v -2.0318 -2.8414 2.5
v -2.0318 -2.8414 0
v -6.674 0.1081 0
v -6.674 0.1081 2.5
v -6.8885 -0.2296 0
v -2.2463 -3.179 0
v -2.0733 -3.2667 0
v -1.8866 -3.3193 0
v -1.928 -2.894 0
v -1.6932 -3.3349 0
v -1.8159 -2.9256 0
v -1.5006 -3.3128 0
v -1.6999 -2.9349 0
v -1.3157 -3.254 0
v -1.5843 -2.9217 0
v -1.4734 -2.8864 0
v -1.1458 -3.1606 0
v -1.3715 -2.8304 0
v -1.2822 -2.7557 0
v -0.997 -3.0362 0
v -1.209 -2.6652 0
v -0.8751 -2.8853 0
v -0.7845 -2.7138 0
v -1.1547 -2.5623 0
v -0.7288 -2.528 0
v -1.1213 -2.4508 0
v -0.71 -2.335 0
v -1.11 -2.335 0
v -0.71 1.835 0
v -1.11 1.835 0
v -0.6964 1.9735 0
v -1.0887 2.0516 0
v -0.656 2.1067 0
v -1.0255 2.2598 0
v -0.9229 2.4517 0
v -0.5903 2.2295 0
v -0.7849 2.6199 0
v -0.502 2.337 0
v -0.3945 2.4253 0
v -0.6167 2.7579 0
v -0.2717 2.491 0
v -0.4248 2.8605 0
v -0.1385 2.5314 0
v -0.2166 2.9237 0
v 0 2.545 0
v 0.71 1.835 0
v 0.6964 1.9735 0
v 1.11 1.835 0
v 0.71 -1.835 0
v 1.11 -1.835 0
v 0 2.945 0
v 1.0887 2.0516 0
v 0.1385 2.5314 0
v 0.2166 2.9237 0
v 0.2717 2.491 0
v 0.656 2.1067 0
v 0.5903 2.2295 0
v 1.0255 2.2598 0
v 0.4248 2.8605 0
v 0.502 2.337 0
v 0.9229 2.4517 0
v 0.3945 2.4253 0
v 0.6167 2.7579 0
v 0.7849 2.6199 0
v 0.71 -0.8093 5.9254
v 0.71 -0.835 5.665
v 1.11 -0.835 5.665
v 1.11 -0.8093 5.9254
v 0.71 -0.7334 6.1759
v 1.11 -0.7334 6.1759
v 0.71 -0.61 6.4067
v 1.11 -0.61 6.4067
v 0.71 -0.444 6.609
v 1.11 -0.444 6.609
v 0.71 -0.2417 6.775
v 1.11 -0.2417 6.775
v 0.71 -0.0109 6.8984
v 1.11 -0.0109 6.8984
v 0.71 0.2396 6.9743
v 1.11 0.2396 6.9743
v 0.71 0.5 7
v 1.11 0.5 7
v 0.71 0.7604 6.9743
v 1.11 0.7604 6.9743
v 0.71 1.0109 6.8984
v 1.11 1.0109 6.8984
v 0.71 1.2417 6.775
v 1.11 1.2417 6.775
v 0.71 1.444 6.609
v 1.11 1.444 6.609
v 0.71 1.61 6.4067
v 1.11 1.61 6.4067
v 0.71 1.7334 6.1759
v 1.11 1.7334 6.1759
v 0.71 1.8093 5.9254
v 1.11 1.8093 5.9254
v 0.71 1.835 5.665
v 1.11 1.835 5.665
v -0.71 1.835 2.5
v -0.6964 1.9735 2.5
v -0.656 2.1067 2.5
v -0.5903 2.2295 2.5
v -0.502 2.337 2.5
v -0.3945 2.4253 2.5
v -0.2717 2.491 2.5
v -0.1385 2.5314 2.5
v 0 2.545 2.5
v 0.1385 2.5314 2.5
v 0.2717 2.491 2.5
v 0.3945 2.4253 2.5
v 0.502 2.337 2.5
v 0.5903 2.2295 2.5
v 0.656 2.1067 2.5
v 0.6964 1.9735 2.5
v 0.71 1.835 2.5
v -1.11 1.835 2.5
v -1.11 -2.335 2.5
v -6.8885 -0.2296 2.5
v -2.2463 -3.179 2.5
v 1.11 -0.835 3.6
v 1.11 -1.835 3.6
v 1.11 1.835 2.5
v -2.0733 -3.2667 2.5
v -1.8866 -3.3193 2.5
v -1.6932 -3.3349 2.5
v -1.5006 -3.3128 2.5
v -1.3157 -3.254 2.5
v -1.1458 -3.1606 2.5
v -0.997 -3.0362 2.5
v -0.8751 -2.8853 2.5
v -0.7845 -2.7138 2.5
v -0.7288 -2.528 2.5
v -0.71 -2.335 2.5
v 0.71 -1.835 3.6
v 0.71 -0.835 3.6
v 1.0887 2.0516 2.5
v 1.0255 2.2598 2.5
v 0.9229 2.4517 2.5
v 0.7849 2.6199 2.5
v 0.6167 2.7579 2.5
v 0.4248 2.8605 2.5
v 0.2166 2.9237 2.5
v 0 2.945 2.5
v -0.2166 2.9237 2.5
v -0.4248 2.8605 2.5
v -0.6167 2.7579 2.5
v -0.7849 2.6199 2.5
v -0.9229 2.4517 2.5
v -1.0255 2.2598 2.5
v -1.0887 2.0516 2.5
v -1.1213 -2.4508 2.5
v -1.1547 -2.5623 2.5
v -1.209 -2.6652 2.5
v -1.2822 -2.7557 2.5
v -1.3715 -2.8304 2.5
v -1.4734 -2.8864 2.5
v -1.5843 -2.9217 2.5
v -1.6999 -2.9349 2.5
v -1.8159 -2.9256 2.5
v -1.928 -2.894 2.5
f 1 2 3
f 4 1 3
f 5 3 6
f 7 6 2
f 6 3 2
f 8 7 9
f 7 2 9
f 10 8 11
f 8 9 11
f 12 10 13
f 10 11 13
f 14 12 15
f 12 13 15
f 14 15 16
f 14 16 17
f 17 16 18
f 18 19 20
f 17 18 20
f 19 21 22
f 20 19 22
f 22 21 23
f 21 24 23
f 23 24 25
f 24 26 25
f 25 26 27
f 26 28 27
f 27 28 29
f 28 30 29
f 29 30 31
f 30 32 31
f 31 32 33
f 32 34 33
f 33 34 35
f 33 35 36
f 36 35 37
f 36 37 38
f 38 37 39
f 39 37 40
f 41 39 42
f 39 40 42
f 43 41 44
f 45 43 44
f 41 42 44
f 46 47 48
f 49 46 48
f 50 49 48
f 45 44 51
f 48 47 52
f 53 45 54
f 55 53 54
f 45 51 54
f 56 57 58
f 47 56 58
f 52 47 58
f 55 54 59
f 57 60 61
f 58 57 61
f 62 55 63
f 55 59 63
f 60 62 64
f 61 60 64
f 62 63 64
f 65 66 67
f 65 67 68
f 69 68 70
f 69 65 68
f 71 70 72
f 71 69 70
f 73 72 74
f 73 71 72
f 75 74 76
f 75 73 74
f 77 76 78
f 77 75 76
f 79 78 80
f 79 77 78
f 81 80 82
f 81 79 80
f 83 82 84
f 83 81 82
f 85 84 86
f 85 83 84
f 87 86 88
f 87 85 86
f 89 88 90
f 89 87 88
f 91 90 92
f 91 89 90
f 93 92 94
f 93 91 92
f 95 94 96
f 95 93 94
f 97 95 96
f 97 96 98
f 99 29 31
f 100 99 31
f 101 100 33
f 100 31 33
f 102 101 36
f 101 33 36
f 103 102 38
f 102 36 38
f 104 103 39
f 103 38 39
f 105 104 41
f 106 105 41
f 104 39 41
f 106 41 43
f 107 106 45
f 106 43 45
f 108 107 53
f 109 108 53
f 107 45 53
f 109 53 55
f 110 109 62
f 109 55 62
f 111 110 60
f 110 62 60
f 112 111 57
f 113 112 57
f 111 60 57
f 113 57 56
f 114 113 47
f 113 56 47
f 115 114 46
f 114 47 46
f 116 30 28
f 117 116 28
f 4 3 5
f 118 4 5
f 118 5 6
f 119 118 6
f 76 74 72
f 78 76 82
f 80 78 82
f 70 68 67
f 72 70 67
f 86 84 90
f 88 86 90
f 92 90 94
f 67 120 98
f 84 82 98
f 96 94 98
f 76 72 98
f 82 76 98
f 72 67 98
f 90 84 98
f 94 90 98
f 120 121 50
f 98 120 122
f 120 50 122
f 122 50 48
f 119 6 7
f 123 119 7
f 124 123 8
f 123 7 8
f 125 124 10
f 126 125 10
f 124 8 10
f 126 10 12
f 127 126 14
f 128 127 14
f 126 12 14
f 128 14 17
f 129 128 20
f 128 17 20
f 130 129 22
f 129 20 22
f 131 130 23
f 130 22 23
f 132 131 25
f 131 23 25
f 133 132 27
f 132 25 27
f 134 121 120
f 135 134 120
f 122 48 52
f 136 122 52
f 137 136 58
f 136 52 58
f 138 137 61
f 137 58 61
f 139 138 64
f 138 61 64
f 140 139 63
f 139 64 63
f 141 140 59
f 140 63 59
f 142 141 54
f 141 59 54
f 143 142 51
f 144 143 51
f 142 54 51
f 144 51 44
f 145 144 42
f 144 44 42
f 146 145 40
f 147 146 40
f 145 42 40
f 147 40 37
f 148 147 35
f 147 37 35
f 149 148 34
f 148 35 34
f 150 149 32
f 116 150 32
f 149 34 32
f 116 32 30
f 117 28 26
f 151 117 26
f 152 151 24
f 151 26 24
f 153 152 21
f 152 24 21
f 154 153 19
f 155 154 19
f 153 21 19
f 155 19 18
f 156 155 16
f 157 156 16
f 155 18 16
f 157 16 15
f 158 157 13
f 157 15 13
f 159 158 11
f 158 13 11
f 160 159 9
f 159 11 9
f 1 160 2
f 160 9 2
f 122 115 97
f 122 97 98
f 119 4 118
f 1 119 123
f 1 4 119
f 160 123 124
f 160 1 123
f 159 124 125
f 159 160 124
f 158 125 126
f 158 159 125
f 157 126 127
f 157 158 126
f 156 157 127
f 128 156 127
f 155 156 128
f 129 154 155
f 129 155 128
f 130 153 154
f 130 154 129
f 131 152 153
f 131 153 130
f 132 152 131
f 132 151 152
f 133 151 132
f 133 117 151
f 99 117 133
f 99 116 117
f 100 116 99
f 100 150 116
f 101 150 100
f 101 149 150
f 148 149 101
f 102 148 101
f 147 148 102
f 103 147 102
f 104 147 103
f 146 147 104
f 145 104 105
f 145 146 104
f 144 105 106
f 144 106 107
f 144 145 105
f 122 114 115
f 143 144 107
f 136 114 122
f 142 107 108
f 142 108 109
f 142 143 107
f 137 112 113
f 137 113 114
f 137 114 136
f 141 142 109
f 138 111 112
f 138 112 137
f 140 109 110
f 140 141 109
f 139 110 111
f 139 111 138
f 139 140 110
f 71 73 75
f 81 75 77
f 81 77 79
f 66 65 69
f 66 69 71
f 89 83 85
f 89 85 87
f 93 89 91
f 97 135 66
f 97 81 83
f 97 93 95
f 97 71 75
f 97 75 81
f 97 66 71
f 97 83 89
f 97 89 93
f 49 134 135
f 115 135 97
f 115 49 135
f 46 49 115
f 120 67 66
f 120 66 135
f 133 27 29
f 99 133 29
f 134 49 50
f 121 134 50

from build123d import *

# Parameters (mm, degrees)
BASE_FLANGE2_DEPTH  = 2.5
SKETCH10_W          = 0.4
SKETCH10_H          = 3.67
BOSS_EXTRUDE1_DEPTH = 4.5
SKETCH11_W          = 3.4
SKETCH11_H          = 1
CUT_EXTRUDE1_DEPTH  = 12.139958989
FILLET1_RADIUS      = 1.335
FILLET1_LENGTH      = 0.4


# Sheet-metal steps are written as plain solids
with BuildPart() as part:
    # Sketch1 → Base-Flange2 (new body)
    with BuildSketch(Plane.XY):
        with BuildLine():
            Line((-6.888528694, -0.229568793), (-2.246268811, -3.179047252))
            ThreePointArc((-2.246268811, -3.179047252), (-1.228475759, -3.211432773), (-0.71, -2.335))
            Line((-0.71, -2.335), (-0.71, -1.835))
            Line((-0.71, -1.835), (-0.71, 1.835))
            ThreePointArc((-0.71, 1.835), (0, 2.545), (0.71, 1.835))
            Line((0.71, 1.835), (0.71, -1.835))
            Line((0.71, -1.835), (1.11, -1.835))
            Line((1.11, -1.835), (1.11, 1.835))
            ThreePointArc((1.11, 1.835), (0, 2.945), (-1.11, 1.835))
            Line((-1.11, 1.835), (-1.11, -1.835))
            Line((-1.11, -1.835), (-1.11, -2.335))
            ThreePointArc((-1.11, -2.335), (-1.421085455, -2.860859664), (-2.031761286, -2.841428351))
            Line((-2.031761286, -2.841428351), (-6.67402117, 0.108050107))
            Line((-6.67402117, 0.108050107), (-6.888528694, -0.229568793))
        make_face()
    extrude(amount=BASE_FLANGE2_DEPTH)

    # Sketch10 → Boss-Extrude1 (add)
    with BuildSketch(Plane.XY.offset(2.5)):
        with Locations((0.91, 0)):
            Rectangle(SKETCH10_W, SKETCH10_H)
    extrude(amount=BOSS_EXTRUDE1_DEPTH)

    # Sketch11 → Cut-Extrude1 (cut, through all)
    with BuildSketch(Plane(origin=(1.11, 0, 0), x_dir=(0, 0, -1), z_dir=(1, 0, 0))):
        with Locations((-5.3, -1.335)):
            Rectangle(SKETCH11_W, SKETCH11_H)
    extrude(amount=-CUT_EXTRUDE1_DEPTH, mode=Mode.SUBTRACT)

    # Fillet1: full round fillet: the end face becomes a half cylinder, R = half its width
    fillet1_face = Plane((0.91, 0.5, 7), x_dir=(-1, 0, 0), z_dir=(0, 0, 1))  # on the end face: x along it, z out of the body
    fillet1_slab = fillet1_face.offset(-FILLET1_RADIUS / 2) * Box(FILLET1_LENGTH, 2 * FILLET1_RADIUS, FILLET1_RADIUS, mode=Mode.PRIVATE)  # the body's end, R deep
    fillet1_round = Plane((0.91, 0.5, 5.665), x_dir=(0, 0, 1), z_dir=(-1, 0, 0)) * Cylinder(FILLET1_RADIUS, FILLET1_LENGTH, mode=Mode.PRIVATE)  # its axis R under the face
    add(fillet1_slab - fillet1_round, mode=Mode.SUBTRACT)


solid = part.part
